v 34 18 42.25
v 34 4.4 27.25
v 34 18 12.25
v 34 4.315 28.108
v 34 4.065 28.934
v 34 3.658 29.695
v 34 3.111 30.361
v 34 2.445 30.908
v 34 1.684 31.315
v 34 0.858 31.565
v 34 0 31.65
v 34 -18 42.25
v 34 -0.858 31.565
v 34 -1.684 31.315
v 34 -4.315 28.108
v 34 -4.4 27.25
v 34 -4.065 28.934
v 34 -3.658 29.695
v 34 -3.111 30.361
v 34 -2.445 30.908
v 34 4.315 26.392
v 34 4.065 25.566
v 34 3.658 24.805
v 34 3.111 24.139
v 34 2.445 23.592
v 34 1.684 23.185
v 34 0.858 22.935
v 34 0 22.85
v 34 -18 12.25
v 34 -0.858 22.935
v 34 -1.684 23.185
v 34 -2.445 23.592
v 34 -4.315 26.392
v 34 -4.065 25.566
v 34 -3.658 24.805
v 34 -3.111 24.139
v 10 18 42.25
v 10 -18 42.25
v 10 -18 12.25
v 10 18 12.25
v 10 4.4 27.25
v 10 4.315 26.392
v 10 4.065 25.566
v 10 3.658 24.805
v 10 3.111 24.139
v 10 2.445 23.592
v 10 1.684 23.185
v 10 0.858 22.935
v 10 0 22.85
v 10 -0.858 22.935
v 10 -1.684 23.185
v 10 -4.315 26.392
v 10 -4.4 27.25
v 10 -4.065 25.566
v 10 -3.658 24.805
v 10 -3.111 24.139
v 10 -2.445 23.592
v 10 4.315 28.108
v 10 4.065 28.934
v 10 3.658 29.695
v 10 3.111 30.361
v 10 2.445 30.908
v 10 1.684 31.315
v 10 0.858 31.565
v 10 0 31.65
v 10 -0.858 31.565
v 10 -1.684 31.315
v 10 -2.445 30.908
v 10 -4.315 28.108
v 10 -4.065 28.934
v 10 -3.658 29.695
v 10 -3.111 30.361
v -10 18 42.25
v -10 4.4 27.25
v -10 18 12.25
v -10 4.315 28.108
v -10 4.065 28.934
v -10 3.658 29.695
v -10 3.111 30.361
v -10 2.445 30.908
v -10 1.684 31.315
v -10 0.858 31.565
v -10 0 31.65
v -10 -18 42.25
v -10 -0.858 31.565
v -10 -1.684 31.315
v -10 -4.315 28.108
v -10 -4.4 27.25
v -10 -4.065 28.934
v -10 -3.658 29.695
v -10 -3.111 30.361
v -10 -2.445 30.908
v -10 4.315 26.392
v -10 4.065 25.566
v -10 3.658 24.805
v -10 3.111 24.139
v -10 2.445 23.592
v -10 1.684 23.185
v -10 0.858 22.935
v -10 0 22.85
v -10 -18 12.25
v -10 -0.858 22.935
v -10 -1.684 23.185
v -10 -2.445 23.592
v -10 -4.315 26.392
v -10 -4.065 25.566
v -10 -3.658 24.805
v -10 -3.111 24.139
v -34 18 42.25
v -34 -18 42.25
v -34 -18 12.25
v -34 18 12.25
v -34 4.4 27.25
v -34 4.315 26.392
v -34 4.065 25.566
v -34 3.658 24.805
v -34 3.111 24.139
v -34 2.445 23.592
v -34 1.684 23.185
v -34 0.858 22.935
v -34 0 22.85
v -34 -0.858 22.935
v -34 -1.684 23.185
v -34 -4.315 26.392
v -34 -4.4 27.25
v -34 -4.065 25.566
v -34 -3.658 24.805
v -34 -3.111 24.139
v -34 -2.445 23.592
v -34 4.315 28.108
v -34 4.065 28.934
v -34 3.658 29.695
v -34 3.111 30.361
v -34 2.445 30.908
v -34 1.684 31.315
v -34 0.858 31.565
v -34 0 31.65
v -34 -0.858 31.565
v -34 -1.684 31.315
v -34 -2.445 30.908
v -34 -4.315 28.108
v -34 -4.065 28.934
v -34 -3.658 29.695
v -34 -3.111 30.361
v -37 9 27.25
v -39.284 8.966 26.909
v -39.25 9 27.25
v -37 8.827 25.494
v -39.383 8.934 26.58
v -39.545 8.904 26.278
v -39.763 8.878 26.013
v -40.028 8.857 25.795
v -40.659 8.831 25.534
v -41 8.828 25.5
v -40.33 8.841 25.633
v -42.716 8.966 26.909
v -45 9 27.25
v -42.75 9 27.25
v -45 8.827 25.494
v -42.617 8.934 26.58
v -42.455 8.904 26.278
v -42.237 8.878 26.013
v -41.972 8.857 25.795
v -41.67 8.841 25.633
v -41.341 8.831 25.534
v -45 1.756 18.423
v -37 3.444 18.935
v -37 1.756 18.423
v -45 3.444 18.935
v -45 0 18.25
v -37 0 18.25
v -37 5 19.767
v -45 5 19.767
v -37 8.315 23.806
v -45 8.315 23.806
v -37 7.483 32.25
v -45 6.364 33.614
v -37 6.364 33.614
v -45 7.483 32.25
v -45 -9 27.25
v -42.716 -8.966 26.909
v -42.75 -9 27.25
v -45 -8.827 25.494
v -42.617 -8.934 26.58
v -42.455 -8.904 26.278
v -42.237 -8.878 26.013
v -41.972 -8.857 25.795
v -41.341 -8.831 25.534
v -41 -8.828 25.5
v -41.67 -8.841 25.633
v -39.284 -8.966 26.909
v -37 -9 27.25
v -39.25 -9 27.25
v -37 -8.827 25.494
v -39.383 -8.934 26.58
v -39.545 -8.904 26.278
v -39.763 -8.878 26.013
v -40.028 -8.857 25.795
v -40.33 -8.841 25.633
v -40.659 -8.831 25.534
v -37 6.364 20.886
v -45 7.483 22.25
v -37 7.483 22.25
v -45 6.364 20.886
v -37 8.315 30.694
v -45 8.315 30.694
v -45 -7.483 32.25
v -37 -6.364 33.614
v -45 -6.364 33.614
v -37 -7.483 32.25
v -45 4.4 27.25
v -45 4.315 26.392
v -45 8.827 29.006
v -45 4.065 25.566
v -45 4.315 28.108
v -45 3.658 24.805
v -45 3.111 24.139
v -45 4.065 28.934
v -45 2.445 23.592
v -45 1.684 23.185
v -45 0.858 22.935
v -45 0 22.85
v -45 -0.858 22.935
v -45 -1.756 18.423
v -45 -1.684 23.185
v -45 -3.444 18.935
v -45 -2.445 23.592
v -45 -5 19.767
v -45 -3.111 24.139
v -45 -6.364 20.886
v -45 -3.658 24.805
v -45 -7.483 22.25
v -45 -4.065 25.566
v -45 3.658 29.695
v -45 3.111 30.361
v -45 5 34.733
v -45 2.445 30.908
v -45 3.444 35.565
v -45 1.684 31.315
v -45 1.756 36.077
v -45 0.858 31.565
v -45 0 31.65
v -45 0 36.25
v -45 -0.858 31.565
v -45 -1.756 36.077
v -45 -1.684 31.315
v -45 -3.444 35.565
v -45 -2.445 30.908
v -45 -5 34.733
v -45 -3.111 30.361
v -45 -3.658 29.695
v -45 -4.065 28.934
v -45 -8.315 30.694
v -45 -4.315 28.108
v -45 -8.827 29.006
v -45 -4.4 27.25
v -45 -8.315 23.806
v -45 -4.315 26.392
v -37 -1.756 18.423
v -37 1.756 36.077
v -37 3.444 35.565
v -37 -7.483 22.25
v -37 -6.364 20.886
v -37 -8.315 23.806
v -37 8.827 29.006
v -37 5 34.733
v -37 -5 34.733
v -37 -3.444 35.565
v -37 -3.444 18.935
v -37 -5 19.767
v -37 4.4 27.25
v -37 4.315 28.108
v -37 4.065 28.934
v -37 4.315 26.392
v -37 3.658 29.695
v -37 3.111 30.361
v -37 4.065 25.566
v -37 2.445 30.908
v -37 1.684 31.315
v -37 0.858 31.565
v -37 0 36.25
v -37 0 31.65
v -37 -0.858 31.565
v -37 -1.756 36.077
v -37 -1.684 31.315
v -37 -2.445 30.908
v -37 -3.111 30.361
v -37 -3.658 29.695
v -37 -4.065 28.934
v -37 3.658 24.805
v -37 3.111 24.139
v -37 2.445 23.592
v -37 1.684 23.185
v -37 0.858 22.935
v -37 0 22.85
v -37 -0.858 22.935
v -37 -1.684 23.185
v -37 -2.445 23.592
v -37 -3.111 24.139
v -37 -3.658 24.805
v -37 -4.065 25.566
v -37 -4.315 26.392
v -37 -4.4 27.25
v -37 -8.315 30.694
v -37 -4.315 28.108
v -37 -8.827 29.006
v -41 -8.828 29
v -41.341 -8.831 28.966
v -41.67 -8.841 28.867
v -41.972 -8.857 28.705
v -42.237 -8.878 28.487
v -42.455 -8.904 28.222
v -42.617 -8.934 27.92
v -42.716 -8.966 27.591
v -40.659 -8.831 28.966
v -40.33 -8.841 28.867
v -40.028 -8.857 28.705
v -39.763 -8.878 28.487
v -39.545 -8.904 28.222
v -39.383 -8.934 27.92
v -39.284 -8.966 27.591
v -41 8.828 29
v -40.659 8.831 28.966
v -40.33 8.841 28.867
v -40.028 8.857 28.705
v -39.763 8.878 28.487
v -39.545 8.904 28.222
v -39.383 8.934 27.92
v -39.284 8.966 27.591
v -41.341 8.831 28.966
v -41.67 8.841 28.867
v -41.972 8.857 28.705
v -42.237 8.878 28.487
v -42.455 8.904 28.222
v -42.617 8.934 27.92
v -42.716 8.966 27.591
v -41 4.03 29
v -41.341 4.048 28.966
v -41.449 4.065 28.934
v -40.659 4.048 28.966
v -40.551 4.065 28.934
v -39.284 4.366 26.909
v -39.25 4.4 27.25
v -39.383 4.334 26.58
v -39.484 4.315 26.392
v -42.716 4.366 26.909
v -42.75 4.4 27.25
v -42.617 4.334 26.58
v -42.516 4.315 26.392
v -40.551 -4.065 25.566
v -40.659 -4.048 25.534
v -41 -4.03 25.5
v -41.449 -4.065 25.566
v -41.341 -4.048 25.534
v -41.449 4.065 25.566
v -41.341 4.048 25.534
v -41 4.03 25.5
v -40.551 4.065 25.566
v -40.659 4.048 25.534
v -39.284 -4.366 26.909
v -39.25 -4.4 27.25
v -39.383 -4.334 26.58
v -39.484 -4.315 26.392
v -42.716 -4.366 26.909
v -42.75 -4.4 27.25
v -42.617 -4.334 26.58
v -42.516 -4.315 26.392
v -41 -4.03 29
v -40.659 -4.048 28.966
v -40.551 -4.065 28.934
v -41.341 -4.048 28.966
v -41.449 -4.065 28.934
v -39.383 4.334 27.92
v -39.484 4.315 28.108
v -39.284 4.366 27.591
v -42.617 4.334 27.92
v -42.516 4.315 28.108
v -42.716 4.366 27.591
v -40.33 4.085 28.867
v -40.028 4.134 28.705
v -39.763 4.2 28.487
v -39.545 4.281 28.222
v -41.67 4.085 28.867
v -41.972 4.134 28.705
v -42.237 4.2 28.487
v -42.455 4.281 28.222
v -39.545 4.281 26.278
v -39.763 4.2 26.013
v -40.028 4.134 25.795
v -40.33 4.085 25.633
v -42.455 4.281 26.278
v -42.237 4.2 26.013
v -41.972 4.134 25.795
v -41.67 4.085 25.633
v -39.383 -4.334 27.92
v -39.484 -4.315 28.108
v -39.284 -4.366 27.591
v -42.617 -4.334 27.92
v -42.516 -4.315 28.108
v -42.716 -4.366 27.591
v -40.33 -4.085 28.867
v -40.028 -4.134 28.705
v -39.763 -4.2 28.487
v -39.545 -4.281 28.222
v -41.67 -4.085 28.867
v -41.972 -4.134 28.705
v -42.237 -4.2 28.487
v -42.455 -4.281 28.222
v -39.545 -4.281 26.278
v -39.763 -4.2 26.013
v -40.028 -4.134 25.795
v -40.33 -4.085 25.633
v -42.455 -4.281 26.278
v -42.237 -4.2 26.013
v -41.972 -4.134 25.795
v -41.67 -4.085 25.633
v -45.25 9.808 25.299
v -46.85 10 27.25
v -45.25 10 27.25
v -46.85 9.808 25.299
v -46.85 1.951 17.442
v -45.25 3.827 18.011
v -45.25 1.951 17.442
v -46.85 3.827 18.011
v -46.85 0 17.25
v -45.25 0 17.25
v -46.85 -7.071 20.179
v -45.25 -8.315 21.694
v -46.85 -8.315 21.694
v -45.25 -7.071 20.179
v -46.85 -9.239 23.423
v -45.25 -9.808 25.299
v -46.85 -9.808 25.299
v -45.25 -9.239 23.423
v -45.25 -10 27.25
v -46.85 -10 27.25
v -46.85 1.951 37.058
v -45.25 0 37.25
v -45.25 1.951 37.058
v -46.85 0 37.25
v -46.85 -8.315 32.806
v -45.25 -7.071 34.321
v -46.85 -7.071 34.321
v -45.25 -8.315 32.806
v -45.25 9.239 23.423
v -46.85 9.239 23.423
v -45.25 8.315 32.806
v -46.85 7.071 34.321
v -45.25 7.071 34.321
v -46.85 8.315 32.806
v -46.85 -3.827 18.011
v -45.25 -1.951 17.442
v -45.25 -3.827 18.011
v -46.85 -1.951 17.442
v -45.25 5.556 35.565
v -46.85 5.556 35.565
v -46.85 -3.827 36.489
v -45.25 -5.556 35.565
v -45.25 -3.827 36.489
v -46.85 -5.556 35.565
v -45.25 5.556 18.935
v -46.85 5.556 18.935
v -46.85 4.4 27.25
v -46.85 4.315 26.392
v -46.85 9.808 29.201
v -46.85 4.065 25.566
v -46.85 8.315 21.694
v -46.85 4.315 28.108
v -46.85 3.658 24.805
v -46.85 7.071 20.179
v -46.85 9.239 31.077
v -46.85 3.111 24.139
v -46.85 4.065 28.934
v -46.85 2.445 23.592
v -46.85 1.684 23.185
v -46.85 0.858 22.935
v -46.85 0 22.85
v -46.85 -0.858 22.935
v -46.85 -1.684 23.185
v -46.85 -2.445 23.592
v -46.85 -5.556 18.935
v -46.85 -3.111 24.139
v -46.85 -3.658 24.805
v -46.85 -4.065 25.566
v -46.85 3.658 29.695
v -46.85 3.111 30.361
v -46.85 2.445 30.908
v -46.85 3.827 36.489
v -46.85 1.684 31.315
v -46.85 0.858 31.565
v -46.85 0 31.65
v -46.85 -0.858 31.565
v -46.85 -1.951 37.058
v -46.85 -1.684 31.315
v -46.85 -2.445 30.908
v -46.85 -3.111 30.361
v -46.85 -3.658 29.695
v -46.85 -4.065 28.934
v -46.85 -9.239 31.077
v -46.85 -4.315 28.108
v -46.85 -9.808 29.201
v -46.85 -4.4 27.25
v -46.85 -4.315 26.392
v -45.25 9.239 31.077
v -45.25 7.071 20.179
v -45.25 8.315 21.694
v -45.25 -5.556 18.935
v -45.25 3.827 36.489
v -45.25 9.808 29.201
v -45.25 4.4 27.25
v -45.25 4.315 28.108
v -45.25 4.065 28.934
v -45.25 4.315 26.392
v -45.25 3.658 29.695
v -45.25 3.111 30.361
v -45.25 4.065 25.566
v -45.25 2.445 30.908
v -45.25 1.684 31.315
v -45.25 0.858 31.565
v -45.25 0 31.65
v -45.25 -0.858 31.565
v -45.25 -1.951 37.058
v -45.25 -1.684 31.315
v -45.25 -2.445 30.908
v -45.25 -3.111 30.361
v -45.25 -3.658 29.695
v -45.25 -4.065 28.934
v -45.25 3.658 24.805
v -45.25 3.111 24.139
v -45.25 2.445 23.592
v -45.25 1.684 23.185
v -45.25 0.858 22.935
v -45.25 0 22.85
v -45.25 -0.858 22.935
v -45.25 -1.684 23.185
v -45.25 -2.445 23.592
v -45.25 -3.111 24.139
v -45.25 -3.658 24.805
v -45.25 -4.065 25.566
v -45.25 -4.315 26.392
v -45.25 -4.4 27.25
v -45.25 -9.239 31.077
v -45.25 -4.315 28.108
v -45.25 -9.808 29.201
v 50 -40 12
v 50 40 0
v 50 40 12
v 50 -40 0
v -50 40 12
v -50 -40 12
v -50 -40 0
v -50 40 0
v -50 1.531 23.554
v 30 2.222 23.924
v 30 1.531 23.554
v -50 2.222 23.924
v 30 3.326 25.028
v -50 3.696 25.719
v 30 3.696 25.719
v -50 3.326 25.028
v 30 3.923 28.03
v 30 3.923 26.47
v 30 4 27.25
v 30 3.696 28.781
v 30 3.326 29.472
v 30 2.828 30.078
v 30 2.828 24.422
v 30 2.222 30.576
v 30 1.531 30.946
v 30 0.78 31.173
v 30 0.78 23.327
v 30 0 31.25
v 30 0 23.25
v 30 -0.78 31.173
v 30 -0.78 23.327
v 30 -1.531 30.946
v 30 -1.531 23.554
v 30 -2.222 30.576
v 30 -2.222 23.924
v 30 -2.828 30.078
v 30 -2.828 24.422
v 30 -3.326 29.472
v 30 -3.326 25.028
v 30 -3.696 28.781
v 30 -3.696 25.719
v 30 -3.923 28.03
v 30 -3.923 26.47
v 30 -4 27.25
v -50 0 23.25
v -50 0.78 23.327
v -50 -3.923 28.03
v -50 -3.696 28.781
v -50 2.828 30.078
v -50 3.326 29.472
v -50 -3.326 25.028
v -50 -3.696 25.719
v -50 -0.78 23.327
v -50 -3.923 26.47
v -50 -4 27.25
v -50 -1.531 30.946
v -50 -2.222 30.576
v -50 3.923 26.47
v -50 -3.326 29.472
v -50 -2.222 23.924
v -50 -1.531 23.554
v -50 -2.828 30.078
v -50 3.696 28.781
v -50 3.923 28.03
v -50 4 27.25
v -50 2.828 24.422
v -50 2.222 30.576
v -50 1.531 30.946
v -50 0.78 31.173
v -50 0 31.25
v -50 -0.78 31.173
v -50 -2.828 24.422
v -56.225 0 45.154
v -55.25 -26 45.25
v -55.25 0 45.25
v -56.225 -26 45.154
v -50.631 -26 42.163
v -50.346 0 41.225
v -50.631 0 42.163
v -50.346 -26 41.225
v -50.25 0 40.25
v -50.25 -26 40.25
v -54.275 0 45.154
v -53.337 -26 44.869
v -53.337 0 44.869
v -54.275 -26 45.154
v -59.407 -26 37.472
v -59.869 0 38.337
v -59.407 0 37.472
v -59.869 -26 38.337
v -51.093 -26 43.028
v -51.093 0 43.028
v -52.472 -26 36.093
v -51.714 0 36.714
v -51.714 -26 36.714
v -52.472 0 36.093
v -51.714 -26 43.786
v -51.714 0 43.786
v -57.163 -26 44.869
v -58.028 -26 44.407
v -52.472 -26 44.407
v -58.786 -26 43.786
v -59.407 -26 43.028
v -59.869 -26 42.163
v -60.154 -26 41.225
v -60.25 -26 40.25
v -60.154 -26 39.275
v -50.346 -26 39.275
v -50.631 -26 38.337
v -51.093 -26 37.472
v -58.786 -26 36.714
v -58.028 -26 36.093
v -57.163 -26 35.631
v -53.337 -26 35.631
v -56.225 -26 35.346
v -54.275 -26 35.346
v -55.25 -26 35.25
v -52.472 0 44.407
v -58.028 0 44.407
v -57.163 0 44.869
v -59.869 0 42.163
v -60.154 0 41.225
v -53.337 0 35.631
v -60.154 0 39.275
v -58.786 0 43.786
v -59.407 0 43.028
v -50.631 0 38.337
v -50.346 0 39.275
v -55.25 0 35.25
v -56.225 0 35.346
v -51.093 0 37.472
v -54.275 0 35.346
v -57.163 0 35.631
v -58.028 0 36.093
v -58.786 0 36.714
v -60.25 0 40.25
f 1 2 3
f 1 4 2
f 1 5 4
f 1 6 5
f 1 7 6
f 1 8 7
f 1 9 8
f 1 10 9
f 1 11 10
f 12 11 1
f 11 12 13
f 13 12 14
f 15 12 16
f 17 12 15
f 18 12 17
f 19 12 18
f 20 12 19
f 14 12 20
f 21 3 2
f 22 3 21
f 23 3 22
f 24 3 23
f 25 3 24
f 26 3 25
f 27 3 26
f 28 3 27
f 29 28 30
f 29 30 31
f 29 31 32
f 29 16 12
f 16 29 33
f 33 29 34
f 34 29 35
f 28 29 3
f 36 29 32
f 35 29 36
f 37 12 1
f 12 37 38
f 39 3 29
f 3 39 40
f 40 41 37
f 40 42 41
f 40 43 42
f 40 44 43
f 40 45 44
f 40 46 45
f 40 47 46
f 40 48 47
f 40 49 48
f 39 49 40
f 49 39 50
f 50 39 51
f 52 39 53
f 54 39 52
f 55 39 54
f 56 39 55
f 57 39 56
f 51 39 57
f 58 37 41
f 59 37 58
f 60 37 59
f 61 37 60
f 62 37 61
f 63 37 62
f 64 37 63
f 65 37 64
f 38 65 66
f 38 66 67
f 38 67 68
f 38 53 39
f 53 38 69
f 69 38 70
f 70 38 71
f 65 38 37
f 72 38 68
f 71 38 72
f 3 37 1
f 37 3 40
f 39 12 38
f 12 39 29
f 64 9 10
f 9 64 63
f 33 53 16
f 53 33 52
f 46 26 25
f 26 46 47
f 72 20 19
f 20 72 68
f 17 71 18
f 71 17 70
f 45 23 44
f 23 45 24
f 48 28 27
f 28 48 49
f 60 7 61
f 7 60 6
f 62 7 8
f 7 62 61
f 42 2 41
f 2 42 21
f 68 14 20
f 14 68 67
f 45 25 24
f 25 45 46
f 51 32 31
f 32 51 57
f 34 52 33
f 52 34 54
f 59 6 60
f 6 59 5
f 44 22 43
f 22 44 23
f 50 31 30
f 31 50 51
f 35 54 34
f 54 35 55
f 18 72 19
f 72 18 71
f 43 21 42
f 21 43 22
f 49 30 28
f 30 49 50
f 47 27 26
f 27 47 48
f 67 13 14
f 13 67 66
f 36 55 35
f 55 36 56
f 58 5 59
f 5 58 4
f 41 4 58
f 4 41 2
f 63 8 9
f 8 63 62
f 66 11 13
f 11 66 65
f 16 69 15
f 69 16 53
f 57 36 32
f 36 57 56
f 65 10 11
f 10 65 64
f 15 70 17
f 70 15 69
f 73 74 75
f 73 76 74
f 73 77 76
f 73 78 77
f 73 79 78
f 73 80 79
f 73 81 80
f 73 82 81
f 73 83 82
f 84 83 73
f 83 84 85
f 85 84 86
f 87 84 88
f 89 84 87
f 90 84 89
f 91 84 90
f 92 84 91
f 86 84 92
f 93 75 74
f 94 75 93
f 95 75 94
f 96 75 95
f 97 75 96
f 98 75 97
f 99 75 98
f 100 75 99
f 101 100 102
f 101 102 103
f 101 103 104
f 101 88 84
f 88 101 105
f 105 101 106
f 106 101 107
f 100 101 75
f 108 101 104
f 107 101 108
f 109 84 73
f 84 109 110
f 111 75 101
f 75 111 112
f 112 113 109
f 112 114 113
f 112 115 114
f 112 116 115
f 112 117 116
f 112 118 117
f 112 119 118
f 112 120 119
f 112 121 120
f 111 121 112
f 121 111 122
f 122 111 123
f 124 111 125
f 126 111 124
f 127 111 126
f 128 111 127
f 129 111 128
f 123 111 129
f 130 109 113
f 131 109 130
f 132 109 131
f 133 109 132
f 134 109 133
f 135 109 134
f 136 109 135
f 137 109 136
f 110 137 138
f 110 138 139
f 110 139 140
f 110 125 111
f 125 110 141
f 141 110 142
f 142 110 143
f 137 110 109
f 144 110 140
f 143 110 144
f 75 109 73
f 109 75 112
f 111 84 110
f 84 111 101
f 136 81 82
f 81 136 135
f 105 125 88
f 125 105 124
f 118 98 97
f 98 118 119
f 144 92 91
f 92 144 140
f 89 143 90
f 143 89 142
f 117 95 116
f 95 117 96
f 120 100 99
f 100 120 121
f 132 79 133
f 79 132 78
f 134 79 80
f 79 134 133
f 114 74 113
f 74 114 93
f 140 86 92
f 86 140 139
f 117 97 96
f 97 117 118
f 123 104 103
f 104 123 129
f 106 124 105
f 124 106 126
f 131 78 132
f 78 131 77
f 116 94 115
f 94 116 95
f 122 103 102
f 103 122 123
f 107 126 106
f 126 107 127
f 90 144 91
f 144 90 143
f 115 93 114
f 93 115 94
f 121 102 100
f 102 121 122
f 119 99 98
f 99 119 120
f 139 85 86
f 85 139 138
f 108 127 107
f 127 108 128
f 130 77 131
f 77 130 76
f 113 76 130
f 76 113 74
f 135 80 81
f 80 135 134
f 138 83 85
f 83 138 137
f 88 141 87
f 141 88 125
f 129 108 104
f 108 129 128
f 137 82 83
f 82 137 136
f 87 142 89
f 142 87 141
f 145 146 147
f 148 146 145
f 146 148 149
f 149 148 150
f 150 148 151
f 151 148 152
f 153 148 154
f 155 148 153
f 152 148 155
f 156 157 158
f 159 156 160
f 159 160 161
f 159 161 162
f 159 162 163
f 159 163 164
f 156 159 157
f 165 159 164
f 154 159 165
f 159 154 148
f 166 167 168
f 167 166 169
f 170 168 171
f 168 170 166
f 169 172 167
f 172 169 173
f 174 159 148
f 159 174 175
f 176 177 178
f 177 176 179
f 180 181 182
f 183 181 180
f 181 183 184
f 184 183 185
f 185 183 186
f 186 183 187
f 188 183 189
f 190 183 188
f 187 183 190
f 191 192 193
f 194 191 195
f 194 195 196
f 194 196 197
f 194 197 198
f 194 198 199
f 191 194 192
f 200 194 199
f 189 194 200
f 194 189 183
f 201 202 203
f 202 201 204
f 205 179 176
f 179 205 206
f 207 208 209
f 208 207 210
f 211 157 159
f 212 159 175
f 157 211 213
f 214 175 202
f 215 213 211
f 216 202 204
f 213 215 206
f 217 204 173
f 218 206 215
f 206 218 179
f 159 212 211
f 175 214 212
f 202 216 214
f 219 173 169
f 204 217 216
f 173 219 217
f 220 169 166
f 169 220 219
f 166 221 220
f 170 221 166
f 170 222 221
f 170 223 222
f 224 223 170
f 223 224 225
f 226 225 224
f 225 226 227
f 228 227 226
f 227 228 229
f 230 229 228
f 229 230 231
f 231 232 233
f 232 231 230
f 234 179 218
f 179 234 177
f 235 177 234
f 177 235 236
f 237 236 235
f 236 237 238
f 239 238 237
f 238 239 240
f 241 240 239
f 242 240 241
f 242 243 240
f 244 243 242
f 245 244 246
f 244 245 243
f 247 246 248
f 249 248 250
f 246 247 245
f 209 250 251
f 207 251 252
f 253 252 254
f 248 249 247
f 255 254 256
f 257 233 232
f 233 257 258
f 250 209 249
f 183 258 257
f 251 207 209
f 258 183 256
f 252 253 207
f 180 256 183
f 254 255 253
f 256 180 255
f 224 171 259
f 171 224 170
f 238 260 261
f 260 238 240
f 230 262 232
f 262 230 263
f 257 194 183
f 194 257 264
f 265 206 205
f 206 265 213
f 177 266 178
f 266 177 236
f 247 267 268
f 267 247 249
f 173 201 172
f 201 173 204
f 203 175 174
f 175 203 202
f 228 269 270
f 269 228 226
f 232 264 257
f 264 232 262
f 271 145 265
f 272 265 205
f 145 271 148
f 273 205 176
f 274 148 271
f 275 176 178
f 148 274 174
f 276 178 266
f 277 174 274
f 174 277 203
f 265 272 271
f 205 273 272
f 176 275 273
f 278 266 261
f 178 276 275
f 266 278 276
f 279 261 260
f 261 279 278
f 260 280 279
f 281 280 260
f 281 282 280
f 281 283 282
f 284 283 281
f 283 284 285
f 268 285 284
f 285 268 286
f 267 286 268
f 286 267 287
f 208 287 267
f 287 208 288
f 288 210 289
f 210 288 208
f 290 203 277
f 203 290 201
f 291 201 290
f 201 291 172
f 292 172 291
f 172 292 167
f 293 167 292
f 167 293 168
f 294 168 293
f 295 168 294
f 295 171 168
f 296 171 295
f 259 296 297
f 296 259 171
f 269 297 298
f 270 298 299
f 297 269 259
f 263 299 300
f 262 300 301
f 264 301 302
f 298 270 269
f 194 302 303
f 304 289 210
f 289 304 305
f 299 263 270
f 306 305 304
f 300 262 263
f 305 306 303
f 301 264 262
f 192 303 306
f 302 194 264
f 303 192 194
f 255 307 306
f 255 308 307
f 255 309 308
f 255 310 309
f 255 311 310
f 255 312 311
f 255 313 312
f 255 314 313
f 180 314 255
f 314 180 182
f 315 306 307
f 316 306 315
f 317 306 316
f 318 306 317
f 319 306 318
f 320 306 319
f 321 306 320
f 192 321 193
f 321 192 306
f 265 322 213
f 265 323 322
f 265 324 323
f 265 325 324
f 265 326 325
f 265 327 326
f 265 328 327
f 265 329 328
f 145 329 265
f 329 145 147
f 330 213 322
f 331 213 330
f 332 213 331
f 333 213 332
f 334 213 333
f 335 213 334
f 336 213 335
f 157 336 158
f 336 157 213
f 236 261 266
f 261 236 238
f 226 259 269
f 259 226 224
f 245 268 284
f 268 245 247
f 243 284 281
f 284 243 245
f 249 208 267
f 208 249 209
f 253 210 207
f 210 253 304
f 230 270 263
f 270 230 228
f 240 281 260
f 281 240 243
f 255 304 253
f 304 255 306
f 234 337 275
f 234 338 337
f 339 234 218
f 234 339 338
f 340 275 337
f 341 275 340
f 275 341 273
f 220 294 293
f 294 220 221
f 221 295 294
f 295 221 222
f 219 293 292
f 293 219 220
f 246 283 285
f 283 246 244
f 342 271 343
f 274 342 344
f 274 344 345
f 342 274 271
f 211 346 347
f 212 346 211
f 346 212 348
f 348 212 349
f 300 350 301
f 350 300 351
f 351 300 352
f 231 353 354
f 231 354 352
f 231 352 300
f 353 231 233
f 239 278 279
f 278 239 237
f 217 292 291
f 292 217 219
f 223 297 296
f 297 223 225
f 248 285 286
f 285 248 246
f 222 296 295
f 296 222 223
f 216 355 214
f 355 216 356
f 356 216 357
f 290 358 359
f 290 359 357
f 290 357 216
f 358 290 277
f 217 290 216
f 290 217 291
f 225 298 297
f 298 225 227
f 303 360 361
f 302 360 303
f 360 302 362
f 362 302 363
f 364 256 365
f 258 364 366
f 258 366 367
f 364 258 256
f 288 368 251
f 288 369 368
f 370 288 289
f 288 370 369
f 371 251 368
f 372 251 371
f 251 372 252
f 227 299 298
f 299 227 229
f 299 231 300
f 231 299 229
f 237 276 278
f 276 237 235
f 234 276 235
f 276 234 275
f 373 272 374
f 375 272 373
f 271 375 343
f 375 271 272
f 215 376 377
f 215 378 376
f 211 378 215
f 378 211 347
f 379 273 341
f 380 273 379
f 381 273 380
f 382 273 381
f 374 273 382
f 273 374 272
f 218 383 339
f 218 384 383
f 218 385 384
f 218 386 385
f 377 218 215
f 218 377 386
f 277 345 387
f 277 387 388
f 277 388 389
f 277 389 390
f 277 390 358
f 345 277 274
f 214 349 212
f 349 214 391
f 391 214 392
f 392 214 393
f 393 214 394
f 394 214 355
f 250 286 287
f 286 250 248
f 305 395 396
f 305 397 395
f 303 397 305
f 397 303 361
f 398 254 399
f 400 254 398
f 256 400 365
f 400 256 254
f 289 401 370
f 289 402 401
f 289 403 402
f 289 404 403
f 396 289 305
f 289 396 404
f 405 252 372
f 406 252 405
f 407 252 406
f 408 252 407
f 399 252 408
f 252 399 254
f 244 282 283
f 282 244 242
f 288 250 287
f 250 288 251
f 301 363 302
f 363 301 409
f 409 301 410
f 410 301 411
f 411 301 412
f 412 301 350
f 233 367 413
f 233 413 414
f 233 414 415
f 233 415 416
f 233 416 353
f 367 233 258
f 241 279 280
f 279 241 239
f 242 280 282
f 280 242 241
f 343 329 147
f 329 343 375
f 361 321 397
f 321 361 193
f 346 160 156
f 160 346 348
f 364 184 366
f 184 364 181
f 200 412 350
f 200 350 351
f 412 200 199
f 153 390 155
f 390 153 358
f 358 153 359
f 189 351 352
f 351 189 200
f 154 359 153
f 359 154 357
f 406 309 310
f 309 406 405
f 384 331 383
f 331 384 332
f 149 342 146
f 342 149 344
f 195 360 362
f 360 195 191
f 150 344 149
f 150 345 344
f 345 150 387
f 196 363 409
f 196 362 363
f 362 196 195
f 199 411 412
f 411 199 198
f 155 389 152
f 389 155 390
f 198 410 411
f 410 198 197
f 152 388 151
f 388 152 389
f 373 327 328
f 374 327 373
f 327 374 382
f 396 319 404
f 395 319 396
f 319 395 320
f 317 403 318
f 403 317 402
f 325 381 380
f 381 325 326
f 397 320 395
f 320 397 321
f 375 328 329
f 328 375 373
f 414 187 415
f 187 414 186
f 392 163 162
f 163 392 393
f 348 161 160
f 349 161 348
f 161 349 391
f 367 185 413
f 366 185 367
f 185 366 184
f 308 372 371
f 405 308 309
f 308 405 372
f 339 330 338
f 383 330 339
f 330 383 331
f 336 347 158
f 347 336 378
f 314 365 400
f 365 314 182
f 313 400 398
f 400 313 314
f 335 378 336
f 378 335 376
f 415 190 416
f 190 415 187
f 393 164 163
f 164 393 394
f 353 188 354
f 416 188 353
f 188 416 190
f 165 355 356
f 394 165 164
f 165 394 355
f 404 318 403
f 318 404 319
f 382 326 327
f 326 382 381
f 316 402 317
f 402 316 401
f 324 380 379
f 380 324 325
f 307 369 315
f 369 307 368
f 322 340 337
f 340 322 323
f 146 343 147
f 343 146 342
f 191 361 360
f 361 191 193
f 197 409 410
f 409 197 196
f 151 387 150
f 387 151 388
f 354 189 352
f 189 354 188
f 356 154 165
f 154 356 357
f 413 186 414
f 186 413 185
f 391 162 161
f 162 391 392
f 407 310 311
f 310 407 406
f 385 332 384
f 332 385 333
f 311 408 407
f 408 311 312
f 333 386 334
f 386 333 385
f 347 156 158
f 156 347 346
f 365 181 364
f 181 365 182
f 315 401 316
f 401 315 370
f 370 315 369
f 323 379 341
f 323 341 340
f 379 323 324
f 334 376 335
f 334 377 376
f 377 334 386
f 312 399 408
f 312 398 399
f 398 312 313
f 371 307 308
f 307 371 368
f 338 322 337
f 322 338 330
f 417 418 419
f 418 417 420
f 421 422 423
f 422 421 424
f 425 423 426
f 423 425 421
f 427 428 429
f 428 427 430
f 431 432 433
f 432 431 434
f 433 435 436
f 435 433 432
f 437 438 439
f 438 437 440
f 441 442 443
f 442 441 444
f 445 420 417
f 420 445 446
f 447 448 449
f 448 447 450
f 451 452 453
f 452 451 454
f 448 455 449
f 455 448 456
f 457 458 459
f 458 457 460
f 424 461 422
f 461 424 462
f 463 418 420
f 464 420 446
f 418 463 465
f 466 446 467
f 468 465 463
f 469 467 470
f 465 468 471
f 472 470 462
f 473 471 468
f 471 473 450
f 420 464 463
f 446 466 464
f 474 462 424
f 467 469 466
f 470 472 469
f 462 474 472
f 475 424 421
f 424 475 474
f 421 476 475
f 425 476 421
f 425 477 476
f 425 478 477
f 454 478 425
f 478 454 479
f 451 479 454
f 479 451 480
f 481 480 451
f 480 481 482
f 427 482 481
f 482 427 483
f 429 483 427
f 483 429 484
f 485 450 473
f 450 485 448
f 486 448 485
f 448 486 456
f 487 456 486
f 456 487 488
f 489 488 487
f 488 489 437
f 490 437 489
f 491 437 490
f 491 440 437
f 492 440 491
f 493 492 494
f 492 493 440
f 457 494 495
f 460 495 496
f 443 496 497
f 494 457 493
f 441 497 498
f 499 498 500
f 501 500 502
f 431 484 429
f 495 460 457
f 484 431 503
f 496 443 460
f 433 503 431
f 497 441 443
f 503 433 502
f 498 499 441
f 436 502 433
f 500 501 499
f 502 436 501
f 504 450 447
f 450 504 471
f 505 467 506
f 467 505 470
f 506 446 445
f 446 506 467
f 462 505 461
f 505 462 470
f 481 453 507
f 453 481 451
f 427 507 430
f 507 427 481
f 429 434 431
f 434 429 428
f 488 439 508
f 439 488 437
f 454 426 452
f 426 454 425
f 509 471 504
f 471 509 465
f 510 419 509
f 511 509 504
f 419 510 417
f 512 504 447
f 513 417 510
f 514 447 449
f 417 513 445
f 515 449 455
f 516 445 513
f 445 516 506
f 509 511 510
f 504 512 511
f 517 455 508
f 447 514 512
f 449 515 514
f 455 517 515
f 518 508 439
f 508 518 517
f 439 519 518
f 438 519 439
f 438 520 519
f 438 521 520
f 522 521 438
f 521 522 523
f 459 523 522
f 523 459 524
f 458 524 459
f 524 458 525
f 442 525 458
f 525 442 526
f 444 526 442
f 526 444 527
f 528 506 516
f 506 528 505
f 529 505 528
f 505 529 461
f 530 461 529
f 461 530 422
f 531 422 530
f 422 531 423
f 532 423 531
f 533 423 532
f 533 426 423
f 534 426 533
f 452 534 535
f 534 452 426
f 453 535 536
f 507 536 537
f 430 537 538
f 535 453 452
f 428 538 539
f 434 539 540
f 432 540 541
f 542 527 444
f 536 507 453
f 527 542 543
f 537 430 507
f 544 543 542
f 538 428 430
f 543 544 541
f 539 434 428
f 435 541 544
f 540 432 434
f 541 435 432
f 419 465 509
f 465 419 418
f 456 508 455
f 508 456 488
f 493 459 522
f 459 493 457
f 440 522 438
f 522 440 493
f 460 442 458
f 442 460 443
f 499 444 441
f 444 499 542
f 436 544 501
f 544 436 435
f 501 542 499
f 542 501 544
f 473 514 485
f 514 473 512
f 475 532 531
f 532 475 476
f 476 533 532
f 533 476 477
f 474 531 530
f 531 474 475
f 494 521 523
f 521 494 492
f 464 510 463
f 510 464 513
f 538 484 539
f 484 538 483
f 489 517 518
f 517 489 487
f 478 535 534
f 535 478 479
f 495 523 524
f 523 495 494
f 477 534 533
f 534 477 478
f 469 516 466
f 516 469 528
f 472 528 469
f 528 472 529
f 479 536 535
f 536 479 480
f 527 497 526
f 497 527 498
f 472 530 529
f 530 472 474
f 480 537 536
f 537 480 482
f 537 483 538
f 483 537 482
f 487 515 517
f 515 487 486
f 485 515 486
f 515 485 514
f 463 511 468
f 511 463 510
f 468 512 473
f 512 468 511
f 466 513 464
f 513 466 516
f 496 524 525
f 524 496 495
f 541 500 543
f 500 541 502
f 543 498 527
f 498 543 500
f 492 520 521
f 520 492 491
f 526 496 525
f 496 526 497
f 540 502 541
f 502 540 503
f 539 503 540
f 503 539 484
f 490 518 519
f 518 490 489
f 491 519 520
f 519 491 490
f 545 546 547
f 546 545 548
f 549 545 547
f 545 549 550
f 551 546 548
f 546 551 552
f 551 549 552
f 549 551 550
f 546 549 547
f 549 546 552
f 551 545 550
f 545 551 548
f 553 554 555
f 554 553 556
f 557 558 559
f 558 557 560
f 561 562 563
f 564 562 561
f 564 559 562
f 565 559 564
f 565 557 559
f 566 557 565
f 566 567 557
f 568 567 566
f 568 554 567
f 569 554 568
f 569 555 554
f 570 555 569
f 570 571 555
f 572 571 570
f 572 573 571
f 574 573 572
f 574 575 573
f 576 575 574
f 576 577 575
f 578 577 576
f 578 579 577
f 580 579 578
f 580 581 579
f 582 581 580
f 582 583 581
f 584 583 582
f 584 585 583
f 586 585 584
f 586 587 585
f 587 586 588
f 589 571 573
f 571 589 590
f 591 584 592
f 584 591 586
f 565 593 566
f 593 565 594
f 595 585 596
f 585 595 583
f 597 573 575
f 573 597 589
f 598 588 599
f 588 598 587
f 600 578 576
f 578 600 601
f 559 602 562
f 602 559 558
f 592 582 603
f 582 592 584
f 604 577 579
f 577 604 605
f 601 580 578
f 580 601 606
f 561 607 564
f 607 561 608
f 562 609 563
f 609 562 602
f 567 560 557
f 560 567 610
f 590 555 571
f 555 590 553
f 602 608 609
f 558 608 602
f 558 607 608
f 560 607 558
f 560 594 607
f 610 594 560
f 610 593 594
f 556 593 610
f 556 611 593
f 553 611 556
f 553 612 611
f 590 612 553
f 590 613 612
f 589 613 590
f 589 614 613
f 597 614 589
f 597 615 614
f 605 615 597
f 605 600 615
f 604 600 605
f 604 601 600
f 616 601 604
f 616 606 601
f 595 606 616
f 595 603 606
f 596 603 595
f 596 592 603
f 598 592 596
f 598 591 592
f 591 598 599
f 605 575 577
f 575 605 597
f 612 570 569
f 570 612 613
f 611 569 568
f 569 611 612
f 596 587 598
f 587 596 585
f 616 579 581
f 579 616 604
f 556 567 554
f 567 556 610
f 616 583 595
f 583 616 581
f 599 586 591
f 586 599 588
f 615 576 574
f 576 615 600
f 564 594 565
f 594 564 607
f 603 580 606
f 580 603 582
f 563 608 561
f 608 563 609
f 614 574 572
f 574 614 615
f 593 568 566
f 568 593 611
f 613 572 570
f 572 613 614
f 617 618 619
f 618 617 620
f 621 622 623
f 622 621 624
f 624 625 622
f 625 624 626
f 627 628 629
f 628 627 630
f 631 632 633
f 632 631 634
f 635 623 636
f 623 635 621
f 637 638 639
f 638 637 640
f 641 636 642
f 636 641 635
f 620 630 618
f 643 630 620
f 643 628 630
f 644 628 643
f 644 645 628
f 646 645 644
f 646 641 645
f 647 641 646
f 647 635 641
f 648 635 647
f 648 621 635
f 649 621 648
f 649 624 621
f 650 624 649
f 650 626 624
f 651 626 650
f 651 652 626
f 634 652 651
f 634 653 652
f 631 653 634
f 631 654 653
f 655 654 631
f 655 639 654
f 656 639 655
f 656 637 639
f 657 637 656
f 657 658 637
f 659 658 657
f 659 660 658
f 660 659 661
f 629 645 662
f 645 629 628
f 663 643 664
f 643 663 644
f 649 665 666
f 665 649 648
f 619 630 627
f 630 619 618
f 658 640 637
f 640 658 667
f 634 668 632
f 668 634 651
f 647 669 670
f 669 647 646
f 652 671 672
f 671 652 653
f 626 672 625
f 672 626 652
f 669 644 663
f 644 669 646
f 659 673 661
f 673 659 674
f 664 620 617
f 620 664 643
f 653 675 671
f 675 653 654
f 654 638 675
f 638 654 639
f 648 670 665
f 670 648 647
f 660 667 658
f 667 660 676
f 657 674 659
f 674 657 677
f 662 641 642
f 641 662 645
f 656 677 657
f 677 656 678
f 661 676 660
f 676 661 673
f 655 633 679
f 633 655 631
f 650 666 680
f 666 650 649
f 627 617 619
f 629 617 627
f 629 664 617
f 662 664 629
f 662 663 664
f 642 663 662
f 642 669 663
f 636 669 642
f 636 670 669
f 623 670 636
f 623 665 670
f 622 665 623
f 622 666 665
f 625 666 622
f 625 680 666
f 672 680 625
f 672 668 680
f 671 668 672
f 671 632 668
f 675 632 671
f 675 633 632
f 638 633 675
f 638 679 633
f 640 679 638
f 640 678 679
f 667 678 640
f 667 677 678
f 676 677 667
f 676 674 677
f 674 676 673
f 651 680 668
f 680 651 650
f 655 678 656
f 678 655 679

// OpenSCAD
$fn = 32;

// ------------------------------------------------------------------------
// Machine vise: screw d8, jaws 24 x 30 mm
// Every part is its own module, assembly() places every instance.
// ------------------------------------------------------------------------

// --- part 1 ---
module vise_bed() {
  difference() {
    translate([-50, -40, 0]) cube([100, 80, 12]);
  }
}

// --- part 2 ---
module vise_jaw() {
  difference() {
    translate([-12, -18, 0]) cube([24, 36, 30]);
    translate([0, 0, 15]) rotate([0, 90, 0]) cylinder(h = 26, d = 8.8, center = true);
  }
}

// --- part 3 ---
module vise_screw() {
  translate([0, 0, -40]) cylinder(h = 80, d = 8);
}

// --- part 4 ---
module screw_collar() {
  difference() {
    cylinder(h = 8, d = 18);
    translate([0, 0, -1]) cylinder(h = 10, d = 8.8);
    translate([0, 0, 4]) rotate([90, 0, 0]) cylinder(h = 20, d = 3.5, center = true);
  }
}

// --- part 5 ---
module screw_washer() {
  difference() {
      translate([0, 0, 0]) cylinder(h = 1.6, d = 20);
      translate([0, 0, -1]) cylinder(h = 3.6, d = 8.8);
    }
}

// --- part 6 ---
module vise_handle() {
  cylinder(h = 26, d = 10);
}

// --- assembly ---
module assembly() {
  color([0.80, 0.24, 0.20]) translate([0, 0, 0]) rotate([0, 0, 0]) vise_bed();
  color([0.20, 0.45, 0.75]) translate([22, 0, 12.25]) rotate([0, 0, 0]) vise_jaw();
  color([0.25, 0.62, 0.32]) translate([-22, 0, 12.25]) rotate([0, 0, 0]) vise_jaw();
  color([0.92, 0.70, 0.18]) translate([-10, 0, 27.25]) rotate([0, 90, 0]) vise_screw();
  color([0.58, 0.35, 0.70]) translate([-45, 0, 27.25]) rotate([0, 90, 0]) screw_collar();
  color([0.16, 0.66, 0.66]) translate([-46.85, 0, 27.25]) rotate([0, 90, 0]) screw_washer();
  color([0.85, 0.48, 0.18]) translate([-55.25, 0, 40.25]) rotate([90, 0, 0]) vise_handle();
}

assembly();
